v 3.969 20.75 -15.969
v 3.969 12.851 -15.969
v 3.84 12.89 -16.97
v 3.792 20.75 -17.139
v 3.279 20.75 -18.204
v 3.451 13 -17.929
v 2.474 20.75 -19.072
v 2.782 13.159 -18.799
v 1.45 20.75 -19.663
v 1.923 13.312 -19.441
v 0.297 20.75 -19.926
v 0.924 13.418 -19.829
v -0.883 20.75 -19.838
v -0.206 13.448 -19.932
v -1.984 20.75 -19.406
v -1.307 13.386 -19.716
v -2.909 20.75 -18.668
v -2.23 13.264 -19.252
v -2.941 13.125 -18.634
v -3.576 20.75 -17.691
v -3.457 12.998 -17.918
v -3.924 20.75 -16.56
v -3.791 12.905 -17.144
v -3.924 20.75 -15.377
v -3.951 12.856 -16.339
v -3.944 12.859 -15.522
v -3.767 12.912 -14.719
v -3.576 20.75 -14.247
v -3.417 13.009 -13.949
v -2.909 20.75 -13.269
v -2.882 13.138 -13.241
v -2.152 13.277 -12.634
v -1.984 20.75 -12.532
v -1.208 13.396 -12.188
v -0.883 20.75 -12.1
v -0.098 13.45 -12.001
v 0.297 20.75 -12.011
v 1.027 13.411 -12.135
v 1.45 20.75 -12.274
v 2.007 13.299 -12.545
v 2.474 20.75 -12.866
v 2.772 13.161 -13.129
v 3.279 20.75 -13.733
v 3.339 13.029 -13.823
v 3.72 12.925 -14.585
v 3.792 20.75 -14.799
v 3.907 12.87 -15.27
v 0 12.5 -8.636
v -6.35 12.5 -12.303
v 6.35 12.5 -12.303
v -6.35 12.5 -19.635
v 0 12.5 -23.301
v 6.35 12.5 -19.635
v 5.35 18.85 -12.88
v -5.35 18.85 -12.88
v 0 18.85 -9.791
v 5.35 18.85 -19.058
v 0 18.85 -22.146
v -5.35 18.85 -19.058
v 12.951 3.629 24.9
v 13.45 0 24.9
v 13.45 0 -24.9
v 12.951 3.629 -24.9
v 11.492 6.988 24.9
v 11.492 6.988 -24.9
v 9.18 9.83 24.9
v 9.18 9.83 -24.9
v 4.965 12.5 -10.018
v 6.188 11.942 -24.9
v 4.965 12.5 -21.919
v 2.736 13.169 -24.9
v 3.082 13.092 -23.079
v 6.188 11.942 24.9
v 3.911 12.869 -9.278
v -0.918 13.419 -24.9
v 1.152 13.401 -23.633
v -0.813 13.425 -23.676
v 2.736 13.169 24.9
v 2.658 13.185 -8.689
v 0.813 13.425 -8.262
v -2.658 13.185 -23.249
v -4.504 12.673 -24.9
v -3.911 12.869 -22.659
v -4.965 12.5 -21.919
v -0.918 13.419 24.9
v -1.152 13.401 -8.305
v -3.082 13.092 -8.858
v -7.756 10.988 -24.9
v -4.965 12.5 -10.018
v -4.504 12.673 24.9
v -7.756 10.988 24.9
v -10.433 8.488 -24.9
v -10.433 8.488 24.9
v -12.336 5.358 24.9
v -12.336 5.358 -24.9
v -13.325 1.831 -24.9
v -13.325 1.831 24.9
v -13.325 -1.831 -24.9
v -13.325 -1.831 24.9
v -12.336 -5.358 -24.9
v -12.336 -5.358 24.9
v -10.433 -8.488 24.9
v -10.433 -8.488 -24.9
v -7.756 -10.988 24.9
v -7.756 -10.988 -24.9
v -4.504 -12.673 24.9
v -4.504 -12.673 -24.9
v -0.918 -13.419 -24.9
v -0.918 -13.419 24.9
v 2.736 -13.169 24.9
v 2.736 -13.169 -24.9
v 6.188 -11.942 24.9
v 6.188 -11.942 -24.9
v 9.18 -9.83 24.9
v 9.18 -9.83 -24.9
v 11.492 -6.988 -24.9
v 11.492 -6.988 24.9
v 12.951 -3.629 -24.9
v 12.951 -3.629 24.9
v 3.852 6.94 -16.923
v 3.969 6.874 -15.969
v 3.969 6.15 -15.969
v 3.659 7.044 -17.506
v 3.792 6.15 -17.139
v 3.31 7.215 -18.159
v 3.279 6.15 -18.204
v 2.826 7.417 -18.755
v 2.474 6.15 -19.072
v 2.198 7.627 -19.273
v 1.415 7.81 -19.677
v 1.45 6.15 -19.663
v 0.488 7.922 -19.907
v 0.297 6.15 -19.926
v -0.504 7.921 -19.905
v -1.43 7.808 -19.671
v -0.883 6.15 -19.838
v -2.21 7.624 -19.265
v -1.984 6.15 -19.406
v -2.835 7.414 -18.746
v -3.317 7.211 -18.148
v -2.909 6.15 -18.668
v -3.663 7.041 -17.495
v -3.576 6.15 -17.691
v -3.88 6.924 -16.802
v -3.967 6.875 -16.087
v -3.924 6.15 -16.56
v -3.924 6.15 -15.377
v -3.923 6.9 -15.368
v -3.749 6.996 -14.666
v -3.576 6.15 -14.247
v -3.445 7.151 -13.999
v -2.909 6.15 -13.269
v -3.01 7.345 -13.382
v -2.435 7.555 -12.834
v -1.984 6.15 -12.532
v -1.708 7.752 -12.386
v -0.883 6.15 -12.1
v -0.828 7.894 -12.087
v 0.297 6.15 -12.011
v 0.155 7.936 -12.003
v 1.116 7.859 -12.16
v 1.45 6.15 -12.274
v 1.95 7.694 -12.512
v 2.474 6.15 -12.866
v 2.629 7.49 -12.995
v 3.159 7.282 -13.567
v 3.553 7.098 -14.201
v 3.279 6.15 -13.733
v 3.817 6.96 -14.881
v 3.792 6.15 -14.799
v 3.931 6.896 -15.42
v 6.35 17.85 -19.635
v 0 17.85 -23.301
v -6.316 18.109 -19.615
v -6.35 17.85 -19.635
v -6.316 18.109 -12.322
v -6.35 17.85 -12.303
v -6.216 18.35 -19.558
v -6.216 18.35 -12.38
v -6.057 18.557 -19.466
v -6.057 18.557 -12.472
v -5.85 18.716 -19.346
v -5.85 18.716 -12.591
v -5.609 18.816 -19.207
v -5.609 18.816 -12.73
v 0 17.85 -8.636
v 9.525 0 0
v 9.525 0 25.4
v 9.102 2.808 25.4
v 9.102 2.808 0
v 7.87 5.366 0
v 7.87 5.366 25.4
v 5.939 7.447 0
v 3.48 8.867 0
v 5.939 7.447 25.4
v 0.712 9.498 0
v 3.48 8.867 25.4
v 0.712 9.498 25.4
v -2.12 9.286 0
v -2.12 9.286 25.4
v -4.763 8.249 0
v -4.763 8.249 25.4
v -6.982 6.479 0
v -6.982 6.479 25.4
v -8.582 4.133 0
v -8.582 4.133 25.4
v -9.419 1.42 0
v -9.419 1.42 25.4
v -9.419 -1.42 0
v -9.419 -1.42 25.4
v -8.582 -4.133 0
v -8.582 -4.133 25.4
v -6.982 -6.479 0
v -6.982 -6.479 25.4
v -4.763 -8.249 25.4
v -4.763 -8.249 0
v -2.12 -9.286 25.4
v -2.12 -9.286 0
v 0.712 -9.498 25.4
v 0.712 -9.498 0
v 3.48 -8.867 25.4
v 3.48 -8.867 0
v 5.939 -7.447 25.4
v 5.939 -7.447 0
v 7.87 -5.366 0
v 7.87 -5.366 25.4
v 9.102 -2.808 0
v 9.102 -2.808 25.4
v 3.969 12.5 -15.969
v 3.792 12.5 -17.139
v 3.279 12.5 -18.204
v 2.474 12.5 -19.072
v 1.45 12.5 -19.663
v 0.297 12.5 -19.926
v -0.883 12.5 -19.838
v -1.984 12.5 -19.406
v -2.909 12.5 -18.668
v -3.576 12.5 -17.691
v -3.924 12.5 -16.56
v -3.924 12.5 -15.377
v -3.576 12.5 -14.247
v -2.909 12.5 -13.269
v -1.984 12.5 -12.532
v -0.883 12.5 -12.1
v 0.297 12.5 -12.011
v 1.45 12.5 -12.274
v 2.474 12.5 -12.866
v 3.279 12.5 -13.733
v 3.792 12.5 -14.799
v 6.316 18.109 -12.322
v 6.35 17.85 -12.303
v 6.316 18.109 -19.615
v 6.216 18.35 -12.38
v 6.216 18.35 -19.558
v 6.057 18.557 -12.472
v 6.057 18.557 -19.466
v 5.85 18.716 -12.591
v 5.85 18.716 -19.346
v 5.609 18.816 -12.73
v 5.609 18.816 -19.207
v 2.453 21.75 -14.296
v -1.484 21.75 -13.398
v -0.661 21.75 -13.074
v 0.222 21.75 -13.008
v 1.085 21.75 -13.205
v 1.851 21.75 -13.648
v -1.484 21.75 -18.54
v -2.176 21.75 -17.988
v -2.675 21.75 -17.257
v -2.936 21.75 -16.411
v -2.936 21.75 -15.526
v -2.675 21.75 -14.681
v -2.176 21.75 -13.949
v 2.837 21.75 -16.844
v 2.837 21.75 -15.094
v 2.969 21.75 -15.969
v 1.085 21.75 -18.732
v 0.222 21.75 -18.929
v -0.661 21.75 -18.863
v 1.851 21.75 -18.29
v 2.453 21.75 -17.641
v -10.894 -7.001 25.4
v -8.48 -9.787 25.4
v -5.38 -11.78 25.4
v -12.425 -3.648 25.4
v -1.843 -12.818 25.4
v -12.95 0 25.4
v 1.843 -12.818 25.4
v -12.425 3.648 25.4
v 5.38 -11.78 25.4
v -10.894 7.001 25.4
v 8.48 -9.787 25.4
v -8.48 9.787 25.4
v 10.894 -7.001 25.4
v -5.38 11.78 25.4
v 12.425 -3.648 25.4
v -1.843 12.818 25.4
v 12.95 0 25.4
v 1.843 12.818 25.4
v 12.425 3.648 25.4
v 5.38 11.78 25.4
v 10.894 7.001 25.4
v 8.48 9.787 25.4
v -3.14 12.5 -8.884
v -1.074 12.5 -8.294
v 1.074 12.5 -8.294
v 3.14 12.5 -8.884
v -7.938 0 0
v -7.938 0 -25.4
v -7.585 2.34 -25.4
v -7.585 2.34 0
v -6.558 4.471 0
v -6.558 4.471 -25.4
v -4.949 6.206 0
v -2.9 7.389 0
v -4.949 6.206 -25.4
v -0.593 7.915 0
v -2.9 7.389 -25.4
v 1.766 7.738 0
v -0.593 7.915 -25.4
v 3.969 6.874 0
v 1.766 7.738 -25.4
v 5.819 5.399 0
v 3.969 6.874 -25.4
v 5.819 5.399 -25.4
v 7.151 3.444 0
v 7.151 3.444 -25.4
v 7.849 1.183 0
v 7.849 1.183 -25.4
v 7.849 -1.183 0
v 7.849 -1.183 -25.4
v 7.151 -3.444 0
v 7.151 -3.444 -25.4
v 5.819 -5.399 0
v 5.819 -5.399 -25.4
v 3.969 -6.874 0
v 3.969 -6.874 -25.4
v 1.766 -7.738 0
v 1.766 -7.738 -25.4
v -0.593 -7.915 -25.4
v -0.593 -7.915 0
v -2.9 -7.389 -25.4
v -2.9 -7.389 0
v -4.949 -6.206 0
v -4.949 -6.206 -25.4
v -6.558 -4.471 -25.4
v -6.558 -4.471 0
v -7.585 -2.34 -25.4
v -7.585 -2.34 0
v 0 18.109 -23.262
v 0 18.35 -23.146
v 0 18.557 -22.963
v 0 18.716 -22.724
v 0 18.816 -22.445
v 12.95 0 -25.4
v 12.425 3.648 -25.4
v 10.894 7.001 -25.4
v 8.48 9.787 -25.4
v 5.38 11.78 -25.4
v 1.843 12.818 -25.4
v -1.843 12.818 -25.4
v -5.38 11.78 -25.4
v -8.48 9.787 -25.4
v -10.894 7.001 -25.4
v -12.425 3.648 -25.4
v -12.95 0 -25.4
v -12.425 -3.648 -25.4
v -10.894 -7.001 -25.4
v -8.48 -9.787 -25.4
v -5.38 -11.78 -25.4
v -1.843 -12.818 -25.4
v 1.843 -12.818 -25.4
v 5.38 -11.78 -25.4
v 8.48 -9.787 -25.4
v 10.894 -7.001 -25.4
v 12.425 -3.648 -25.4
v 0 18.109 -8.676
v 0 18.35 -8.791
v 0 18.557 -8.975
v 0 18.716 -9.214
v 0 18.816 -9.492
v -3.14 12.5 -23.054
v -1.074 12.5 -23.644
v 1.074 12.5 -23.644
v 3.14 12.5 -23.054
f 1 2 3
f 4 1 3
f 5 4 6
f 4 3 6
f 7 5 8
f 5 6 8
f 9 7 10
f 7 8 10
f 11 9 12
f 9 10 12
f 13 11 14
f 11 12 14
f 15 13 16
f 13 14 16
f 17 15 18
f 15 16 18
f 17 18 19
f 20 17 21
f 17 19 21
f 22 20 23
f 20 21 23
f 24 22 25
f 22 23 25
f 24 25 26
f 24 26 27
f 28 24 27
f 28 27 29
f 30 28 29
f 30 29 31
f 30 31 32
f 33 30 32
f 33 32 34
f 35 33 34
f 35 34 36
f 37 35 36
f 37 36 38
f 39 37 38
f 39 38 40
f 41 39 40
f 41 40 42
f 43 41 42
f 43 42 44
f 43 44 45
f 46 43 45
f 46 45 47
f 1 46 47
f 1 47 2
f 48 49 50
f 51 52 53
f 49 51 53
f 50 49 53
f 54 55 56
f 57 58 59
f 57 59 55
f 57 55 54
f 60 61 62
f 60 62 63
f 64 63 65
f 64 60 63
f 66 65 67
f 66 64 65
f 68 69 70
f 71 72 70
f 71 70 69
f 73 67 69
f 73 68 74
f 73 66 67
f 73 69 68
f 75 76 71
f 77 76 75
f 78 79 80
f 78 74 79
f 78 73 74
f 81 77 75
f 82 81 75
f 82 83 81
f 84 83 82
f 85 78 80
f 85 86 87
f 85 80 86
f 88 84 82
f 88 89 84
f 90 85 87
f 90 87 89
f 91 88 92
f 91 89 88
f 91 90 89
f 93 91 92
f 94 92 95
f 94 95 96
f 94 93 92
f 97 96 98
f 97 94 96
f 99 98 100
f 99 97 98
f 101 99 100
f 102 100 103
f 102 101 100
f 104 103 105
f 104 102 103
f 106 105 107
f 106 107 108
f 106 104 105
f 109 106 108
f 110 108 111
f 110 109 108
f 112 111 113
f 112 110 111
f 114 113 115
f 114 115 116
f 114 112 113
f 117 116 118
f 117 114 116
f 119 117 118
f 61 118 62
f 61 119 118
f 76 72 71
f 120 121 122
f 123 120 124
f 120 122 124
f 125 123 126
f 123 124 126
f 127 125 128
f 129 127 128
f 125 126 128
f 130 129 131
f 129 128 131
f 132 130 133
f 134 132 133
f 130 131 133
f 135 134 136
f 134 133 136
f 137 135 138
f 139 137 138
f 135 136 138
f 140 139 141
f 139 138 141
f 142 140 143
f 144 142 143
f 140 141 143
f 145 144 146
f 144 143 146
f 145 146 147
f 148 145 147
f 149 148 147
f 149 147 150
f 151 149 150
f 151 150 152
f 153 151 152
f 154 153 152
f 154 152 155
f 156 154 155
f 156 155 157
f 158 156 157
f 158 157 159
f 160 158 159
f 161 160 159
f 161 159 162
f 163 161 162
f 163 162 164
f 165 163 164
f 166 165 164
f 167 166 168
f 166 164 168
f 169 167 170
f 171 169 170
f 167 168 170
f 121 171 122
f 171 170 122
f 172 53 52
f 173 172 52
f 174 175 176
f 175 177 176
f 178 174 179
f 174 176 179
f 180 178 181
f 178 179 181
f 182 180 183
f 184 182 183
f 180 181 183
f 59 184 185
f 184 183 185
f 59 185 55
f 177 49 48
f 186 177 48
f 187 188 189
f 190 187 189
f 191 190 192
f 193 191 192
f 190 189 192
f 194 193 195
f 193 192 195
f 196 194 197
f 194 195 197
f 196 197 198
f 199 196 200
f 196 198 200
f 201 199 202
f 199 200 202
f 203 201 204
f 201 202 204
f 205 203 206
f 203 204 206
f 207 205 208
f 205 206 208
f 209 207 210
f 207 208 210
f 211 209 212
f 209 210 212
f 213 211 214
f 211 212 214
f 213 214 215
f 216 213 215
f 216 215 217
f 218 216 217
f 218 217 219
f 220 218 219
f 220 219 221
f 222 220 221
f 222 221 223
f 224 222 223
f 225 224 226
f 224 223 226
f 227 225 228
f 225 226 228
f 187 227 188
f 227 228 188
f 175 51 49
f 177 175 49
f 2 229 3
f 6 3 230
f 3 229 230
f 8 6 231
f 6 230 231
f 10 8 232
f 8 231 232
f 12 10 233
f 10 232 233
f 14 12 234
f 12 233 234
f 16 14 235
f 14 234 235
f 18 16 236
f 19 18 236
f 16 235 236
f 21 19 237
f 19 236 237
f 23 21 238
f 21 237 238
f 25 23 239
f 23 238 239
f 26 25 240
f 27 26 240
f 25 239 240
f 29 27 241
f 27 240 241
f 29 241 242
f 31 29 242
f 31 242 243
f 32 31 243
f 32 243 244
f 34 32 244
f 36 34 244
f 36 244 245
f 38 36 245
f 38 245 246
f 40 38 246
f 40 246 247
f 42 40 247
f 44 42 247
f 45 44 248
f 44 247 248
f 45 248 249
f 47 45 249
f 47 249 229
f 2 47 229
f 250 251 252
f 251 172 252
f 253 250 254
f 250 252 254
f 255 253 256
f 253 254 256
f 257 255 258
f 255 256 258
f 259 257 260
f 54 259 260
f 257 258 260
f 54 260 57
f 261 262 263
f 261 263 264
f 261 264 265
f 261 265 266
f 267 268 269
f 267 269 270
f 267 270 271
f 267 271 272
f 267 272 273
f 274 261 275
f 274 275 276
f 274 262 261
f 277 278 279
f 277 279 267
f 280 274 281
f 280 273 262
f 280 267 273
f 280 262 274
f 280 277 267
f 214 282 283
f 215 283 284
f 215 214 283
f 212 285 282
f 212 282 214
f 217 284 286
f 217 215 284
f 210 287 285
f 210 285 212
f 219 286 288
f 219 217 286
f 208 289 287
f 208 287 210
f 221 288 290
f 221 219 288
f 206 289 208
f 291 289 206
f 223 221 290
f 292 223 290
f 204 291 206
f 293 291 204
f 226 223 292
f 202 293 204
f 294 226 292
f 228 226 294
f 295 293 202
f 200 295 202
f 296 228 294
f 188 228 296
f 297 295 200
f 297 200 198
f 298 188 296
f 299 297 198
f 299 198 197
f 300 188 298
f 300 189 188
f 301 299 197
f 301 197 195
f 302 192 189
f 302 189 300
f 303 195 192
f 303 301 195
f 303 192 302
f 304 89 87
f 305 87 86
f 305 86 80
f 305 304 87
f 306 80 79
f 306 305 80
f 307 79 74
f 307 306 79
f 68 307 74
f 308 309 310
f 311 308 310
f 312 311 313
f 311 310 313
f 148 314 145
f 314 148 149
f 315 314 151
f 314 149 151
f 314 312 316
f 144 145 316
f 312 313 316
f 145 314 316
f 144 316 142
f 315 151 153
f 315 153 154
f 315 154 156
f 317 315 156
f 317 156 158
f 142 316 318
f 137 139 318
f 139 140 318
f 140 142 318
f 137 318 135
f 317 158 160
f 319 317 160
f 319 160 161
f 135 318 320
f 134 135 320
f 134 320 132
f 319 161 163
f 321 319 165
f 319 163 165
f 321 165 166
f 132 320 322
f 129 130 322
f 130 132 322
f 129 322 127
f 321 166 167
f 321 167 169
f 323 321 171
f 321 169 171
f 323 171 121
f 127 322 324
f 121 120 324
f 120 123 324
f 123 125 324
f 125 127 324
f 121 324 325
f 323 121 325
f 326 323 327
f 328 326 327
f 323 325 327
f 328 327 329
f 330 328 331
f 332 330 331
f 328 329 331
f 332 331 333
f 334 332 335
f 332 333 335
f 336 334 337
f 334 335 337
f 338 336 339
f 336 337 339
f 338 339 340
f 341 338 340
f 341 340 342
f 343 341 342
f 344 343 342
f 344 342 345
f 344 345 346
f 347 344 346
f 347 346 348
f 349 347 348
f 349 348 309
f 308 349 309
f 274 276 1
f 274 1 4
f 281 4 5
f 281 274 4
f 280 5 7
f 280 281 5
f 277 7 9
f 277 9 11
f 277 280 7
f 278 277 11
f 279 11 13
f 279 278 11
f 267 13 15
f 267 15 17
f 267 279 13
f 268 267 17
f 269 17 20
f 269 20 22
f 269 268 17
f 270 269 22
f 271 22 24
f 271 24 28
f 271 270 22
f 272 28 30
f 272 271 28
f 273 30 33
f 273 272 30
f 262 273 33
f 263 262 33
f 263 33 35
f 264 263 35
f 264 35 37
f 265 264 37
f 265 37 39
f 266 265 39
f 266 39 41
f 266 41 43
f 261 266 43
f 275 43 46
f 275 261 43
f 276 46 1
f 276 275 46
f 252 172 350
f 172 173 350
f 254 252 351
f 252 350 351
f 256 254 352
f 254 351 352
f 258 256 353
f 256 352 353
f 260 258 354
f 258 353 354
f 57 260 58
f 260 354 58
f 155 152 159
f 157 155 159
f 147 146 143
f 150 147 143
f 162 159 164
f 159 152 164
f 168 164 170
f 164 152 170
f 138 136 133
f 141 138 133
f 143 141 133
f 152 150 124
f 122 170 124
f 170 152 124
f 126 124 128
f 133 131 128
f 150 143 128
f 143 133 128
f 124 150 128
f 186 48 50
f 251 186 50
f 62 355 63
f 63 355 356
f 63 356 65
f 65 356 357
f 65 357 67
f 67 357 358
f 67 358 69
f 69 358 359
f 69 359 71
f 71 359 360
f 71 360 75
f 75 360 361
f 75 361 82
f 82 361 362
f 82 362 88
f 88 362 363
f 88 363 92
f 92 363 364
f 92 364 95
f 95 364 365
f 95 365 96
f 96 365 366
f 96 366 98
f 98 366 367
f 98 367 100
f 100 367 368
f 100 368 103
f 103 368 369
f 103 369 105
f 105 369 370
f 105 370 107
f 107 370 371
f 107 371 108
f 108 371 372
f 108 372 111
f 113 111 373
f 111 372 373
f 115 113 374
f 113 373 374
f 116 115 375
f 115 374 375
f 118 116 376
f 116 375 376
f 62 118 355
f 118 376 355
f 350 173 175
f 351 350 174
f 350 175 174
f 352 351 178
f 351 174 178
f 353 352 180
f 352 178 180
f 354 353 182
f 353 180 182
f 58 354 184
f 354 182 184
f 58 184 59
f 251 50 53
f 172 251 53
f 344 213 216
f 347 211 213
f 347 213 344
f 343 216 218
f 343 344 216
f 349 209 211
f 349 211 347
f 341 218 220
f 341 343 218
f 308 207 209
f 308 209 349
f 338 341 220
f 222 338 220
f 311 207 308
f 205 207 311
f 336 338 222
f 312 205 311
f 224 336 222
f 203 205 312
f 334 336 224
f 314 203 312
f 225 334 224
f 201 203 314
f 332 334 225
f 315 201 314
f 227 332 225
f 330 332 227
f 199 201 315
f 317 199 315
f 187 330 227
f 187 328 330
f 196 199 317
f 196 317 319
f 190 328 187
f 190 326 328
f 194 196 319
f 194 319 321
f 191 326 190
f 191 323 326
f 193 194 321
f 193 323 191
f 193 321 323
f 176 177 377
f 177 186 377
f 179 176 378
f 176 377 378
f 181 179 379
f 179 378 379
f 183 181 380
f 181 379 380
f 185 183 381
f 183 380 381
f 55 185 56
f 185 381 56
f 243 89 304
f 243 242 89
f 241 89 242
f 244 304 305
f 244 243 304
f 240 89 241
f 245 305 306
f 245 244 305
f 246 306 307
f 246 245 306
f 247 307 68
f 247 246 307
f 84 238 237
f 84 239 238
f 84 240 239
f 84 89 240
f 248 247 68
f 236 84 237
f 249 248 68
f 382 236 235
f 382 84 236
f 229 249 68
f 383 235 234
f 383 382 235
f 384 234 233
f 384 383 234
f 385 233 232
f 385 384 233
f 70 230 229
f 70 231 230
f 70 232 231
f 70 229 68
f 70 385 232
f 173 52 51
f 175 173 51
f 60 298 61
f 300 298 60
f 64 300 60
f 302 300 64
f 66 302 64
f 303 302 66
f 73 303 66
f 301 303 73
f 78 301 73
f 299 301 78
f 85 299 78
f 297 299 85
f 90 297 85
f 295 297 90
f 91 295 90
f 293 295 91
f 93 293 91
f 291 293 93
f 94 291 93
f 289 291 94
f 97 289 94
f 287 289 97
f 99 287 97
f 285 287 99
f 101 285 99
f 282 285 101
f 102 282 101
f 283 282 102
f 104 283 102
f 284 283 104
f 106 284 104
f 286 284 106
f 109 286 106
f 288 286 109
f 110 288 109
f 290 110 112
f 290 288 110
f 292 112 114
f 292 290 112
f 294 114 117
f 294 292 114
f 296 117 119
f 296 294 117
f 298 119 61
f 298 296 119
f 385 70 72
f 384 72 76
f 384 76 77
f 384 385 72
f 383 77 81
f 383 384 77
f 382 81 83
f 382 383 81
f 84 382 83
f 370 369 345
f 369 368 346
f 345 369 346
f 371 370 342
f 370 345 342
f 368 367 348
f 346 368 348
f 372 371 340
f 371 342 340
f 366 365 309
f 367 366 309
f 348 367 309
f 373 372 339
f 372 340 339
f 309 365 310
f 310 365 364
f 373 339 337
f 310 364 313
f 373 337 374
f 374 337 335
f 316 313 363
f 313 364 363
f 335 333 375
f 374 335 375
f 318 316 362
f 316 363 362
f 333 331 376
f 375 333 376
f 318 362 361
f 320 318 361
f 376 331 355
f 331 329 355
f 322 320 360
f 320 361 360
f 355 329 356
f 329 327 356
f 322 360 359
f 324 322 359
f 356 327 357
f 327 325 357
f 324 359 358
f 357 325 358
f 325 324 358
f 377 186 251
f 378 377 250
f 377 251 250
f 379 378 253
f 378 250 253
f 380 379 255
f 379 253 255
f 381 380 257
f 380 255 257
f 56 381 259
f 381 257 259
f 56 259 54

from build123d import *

# Parameters (mm, degrees)
BOSS_EXTRUDE1_DEPTH      = 25.4
BOSS_EXTRUDE1_DEPTH_BACK = 25.4
SKETCH1_R                = 13.45
SKETCH2_R                = 9.525
CUT_EXTRUDE1_DEPTH       = 25.4
SKETCH3_R                = 7.9375
CUT_EXTRUDE2_DEPTH       = 55.244308457
BOSS_EXTRUDE2_START      = 6.15
SKETCH4_R                = 3.96875
BOSS_EXTRUDE2_DEPTH      = 15.6
CUT_EXTRUDE4_START       = 12.5
SKETCH5_R                = 7.75
SKETCH5_R_2              = 3.96875
CUT_EXTRUDE4_DEPTH       = 24.543376814
BOSS_EXTRUDE3_DEPTH      = 6.35
FILLET1_R                = 1
CHAMFER1_SIZE            = 1
CHAMFER2_SIZE            = 0.5


with BuildPart() as part:
    # Sketch1 → Boss-Extrude1 (new, two sides: drawn at the far end of the back side and taken through both)
    with BuildSketch(Plane.XY.offset(-BOSS_EXTRUDE1_DEPTH_BACK)):
        Circle(SKETCH1_R)
    extrude(amount=BOSS_EXTRUDE1_DEPTH + BOSS_EXTRUDE1_DEPTH_BACK)

    # Sketch2 → Cut-Extrude1 (cut)
    with BuildSketch(Plane.XY.offset(25.4)):
        Circle(SKETCH2_R)
    extrude(amount=-CUT_EXTRUDE1_DEPTH, mode=Mode.SUBTRACT)

    # Sketch3 → Cut-Extrude2 (cut, through all)
    with BuildSketch(Plane(origin=(0, 0, -25.4), x_dir=(-1, 0, 0), z_dir=(0, 0, -1))):
        Circle(SKETCH3_R)
    extrude(amount=-CUT_EXTRUDE2_DEPTH, mode=Mode.SUBTRACT)

    # Sketch4 → Boss-Extrude2 (add)
    with BuildSketch(Plane(origin=(0, 0, 0), x_dir=(1, 0, 0), z_dir=(0, 1, 0)).offset(BOSS_EXTRUDE2_START)):
        with Locations((0, 15.96875)):
            Circle(SKETCH4_R)
    extrude(amount=BOSS_EXTRUDE2_DEPTH)

    # Sketch5 → Cut-Extrude4 (cut, through all)
    with BuildSketch(Plane(origin=(0, 0, 0), x_dir=(1, 0, 0), z_dir=(0, 1, 0)).offset(CUT_EXTRUDE4_START)):
        with Locations((0, 15.96875)):
            Circle(SKETCH5_R)
        with Locations((0, 15.96875)):
            Circle(SKETCH5_R_2, mode=Mode.SUBTRACT)
    extrude(amount=CUT_EXTRUDE4_DEPTH, mode=Mode.SUBTRACT)

    # Chamfer1
    chamfer1_edges = [part.edges().sort_by_distance(p)[0] for p in [
        (-3.96875, 21.75, -15.96875),
    ]]
    chamfer(chamfer1_edges, length=CHAMFER1_SIZE)

    # Chamfer2
    chamfer2_edges = [part.edges().sort_by_distance(p)[0] for p in [
        (-13.45, 0, -25.4),
        (-13.45, 0, 25.4),
    ]]
    chamfer(chamfer2_edges, length=CHAMFER2_SIZE)


with BuildPart() as body_2:
    # Sketch6 → Boss-Extrude3 (new body)
    with BuildSketch(Plane(origin=(0, 12.5, 0), x_dir=(1, 0, 0), z_dir=(0, 1, 0))):
        Polygon((6.35, 12.302575791), (6.35, 19.634924209), (0, 23.301098419), (-6.35, 19.634924209), (-6.35, 12.302575791), (0, 8.636401581), align=None)
    extrude(amount=BOSS_EXTRUDE3_DEPTH)

    # Fillet1
    fillet1_edges = [body_2.edges().sort_by_distance(p)[0] for p in [
        (-3.175, 18.85, -10.469488686),
        (-6.35, 18.85, -15.96875),
        (-3.175, 18.85, -21.468011314),
        (3.175, 18.85, -21.468011314),
        (6.35, 18.85, -15.96875),
        (3.175, 18.85, -10.469488686),
    ]]
    fillet(fillet1_edges, radius=FILLET1_R)


solid = Compound([part.part, body_2.part])
